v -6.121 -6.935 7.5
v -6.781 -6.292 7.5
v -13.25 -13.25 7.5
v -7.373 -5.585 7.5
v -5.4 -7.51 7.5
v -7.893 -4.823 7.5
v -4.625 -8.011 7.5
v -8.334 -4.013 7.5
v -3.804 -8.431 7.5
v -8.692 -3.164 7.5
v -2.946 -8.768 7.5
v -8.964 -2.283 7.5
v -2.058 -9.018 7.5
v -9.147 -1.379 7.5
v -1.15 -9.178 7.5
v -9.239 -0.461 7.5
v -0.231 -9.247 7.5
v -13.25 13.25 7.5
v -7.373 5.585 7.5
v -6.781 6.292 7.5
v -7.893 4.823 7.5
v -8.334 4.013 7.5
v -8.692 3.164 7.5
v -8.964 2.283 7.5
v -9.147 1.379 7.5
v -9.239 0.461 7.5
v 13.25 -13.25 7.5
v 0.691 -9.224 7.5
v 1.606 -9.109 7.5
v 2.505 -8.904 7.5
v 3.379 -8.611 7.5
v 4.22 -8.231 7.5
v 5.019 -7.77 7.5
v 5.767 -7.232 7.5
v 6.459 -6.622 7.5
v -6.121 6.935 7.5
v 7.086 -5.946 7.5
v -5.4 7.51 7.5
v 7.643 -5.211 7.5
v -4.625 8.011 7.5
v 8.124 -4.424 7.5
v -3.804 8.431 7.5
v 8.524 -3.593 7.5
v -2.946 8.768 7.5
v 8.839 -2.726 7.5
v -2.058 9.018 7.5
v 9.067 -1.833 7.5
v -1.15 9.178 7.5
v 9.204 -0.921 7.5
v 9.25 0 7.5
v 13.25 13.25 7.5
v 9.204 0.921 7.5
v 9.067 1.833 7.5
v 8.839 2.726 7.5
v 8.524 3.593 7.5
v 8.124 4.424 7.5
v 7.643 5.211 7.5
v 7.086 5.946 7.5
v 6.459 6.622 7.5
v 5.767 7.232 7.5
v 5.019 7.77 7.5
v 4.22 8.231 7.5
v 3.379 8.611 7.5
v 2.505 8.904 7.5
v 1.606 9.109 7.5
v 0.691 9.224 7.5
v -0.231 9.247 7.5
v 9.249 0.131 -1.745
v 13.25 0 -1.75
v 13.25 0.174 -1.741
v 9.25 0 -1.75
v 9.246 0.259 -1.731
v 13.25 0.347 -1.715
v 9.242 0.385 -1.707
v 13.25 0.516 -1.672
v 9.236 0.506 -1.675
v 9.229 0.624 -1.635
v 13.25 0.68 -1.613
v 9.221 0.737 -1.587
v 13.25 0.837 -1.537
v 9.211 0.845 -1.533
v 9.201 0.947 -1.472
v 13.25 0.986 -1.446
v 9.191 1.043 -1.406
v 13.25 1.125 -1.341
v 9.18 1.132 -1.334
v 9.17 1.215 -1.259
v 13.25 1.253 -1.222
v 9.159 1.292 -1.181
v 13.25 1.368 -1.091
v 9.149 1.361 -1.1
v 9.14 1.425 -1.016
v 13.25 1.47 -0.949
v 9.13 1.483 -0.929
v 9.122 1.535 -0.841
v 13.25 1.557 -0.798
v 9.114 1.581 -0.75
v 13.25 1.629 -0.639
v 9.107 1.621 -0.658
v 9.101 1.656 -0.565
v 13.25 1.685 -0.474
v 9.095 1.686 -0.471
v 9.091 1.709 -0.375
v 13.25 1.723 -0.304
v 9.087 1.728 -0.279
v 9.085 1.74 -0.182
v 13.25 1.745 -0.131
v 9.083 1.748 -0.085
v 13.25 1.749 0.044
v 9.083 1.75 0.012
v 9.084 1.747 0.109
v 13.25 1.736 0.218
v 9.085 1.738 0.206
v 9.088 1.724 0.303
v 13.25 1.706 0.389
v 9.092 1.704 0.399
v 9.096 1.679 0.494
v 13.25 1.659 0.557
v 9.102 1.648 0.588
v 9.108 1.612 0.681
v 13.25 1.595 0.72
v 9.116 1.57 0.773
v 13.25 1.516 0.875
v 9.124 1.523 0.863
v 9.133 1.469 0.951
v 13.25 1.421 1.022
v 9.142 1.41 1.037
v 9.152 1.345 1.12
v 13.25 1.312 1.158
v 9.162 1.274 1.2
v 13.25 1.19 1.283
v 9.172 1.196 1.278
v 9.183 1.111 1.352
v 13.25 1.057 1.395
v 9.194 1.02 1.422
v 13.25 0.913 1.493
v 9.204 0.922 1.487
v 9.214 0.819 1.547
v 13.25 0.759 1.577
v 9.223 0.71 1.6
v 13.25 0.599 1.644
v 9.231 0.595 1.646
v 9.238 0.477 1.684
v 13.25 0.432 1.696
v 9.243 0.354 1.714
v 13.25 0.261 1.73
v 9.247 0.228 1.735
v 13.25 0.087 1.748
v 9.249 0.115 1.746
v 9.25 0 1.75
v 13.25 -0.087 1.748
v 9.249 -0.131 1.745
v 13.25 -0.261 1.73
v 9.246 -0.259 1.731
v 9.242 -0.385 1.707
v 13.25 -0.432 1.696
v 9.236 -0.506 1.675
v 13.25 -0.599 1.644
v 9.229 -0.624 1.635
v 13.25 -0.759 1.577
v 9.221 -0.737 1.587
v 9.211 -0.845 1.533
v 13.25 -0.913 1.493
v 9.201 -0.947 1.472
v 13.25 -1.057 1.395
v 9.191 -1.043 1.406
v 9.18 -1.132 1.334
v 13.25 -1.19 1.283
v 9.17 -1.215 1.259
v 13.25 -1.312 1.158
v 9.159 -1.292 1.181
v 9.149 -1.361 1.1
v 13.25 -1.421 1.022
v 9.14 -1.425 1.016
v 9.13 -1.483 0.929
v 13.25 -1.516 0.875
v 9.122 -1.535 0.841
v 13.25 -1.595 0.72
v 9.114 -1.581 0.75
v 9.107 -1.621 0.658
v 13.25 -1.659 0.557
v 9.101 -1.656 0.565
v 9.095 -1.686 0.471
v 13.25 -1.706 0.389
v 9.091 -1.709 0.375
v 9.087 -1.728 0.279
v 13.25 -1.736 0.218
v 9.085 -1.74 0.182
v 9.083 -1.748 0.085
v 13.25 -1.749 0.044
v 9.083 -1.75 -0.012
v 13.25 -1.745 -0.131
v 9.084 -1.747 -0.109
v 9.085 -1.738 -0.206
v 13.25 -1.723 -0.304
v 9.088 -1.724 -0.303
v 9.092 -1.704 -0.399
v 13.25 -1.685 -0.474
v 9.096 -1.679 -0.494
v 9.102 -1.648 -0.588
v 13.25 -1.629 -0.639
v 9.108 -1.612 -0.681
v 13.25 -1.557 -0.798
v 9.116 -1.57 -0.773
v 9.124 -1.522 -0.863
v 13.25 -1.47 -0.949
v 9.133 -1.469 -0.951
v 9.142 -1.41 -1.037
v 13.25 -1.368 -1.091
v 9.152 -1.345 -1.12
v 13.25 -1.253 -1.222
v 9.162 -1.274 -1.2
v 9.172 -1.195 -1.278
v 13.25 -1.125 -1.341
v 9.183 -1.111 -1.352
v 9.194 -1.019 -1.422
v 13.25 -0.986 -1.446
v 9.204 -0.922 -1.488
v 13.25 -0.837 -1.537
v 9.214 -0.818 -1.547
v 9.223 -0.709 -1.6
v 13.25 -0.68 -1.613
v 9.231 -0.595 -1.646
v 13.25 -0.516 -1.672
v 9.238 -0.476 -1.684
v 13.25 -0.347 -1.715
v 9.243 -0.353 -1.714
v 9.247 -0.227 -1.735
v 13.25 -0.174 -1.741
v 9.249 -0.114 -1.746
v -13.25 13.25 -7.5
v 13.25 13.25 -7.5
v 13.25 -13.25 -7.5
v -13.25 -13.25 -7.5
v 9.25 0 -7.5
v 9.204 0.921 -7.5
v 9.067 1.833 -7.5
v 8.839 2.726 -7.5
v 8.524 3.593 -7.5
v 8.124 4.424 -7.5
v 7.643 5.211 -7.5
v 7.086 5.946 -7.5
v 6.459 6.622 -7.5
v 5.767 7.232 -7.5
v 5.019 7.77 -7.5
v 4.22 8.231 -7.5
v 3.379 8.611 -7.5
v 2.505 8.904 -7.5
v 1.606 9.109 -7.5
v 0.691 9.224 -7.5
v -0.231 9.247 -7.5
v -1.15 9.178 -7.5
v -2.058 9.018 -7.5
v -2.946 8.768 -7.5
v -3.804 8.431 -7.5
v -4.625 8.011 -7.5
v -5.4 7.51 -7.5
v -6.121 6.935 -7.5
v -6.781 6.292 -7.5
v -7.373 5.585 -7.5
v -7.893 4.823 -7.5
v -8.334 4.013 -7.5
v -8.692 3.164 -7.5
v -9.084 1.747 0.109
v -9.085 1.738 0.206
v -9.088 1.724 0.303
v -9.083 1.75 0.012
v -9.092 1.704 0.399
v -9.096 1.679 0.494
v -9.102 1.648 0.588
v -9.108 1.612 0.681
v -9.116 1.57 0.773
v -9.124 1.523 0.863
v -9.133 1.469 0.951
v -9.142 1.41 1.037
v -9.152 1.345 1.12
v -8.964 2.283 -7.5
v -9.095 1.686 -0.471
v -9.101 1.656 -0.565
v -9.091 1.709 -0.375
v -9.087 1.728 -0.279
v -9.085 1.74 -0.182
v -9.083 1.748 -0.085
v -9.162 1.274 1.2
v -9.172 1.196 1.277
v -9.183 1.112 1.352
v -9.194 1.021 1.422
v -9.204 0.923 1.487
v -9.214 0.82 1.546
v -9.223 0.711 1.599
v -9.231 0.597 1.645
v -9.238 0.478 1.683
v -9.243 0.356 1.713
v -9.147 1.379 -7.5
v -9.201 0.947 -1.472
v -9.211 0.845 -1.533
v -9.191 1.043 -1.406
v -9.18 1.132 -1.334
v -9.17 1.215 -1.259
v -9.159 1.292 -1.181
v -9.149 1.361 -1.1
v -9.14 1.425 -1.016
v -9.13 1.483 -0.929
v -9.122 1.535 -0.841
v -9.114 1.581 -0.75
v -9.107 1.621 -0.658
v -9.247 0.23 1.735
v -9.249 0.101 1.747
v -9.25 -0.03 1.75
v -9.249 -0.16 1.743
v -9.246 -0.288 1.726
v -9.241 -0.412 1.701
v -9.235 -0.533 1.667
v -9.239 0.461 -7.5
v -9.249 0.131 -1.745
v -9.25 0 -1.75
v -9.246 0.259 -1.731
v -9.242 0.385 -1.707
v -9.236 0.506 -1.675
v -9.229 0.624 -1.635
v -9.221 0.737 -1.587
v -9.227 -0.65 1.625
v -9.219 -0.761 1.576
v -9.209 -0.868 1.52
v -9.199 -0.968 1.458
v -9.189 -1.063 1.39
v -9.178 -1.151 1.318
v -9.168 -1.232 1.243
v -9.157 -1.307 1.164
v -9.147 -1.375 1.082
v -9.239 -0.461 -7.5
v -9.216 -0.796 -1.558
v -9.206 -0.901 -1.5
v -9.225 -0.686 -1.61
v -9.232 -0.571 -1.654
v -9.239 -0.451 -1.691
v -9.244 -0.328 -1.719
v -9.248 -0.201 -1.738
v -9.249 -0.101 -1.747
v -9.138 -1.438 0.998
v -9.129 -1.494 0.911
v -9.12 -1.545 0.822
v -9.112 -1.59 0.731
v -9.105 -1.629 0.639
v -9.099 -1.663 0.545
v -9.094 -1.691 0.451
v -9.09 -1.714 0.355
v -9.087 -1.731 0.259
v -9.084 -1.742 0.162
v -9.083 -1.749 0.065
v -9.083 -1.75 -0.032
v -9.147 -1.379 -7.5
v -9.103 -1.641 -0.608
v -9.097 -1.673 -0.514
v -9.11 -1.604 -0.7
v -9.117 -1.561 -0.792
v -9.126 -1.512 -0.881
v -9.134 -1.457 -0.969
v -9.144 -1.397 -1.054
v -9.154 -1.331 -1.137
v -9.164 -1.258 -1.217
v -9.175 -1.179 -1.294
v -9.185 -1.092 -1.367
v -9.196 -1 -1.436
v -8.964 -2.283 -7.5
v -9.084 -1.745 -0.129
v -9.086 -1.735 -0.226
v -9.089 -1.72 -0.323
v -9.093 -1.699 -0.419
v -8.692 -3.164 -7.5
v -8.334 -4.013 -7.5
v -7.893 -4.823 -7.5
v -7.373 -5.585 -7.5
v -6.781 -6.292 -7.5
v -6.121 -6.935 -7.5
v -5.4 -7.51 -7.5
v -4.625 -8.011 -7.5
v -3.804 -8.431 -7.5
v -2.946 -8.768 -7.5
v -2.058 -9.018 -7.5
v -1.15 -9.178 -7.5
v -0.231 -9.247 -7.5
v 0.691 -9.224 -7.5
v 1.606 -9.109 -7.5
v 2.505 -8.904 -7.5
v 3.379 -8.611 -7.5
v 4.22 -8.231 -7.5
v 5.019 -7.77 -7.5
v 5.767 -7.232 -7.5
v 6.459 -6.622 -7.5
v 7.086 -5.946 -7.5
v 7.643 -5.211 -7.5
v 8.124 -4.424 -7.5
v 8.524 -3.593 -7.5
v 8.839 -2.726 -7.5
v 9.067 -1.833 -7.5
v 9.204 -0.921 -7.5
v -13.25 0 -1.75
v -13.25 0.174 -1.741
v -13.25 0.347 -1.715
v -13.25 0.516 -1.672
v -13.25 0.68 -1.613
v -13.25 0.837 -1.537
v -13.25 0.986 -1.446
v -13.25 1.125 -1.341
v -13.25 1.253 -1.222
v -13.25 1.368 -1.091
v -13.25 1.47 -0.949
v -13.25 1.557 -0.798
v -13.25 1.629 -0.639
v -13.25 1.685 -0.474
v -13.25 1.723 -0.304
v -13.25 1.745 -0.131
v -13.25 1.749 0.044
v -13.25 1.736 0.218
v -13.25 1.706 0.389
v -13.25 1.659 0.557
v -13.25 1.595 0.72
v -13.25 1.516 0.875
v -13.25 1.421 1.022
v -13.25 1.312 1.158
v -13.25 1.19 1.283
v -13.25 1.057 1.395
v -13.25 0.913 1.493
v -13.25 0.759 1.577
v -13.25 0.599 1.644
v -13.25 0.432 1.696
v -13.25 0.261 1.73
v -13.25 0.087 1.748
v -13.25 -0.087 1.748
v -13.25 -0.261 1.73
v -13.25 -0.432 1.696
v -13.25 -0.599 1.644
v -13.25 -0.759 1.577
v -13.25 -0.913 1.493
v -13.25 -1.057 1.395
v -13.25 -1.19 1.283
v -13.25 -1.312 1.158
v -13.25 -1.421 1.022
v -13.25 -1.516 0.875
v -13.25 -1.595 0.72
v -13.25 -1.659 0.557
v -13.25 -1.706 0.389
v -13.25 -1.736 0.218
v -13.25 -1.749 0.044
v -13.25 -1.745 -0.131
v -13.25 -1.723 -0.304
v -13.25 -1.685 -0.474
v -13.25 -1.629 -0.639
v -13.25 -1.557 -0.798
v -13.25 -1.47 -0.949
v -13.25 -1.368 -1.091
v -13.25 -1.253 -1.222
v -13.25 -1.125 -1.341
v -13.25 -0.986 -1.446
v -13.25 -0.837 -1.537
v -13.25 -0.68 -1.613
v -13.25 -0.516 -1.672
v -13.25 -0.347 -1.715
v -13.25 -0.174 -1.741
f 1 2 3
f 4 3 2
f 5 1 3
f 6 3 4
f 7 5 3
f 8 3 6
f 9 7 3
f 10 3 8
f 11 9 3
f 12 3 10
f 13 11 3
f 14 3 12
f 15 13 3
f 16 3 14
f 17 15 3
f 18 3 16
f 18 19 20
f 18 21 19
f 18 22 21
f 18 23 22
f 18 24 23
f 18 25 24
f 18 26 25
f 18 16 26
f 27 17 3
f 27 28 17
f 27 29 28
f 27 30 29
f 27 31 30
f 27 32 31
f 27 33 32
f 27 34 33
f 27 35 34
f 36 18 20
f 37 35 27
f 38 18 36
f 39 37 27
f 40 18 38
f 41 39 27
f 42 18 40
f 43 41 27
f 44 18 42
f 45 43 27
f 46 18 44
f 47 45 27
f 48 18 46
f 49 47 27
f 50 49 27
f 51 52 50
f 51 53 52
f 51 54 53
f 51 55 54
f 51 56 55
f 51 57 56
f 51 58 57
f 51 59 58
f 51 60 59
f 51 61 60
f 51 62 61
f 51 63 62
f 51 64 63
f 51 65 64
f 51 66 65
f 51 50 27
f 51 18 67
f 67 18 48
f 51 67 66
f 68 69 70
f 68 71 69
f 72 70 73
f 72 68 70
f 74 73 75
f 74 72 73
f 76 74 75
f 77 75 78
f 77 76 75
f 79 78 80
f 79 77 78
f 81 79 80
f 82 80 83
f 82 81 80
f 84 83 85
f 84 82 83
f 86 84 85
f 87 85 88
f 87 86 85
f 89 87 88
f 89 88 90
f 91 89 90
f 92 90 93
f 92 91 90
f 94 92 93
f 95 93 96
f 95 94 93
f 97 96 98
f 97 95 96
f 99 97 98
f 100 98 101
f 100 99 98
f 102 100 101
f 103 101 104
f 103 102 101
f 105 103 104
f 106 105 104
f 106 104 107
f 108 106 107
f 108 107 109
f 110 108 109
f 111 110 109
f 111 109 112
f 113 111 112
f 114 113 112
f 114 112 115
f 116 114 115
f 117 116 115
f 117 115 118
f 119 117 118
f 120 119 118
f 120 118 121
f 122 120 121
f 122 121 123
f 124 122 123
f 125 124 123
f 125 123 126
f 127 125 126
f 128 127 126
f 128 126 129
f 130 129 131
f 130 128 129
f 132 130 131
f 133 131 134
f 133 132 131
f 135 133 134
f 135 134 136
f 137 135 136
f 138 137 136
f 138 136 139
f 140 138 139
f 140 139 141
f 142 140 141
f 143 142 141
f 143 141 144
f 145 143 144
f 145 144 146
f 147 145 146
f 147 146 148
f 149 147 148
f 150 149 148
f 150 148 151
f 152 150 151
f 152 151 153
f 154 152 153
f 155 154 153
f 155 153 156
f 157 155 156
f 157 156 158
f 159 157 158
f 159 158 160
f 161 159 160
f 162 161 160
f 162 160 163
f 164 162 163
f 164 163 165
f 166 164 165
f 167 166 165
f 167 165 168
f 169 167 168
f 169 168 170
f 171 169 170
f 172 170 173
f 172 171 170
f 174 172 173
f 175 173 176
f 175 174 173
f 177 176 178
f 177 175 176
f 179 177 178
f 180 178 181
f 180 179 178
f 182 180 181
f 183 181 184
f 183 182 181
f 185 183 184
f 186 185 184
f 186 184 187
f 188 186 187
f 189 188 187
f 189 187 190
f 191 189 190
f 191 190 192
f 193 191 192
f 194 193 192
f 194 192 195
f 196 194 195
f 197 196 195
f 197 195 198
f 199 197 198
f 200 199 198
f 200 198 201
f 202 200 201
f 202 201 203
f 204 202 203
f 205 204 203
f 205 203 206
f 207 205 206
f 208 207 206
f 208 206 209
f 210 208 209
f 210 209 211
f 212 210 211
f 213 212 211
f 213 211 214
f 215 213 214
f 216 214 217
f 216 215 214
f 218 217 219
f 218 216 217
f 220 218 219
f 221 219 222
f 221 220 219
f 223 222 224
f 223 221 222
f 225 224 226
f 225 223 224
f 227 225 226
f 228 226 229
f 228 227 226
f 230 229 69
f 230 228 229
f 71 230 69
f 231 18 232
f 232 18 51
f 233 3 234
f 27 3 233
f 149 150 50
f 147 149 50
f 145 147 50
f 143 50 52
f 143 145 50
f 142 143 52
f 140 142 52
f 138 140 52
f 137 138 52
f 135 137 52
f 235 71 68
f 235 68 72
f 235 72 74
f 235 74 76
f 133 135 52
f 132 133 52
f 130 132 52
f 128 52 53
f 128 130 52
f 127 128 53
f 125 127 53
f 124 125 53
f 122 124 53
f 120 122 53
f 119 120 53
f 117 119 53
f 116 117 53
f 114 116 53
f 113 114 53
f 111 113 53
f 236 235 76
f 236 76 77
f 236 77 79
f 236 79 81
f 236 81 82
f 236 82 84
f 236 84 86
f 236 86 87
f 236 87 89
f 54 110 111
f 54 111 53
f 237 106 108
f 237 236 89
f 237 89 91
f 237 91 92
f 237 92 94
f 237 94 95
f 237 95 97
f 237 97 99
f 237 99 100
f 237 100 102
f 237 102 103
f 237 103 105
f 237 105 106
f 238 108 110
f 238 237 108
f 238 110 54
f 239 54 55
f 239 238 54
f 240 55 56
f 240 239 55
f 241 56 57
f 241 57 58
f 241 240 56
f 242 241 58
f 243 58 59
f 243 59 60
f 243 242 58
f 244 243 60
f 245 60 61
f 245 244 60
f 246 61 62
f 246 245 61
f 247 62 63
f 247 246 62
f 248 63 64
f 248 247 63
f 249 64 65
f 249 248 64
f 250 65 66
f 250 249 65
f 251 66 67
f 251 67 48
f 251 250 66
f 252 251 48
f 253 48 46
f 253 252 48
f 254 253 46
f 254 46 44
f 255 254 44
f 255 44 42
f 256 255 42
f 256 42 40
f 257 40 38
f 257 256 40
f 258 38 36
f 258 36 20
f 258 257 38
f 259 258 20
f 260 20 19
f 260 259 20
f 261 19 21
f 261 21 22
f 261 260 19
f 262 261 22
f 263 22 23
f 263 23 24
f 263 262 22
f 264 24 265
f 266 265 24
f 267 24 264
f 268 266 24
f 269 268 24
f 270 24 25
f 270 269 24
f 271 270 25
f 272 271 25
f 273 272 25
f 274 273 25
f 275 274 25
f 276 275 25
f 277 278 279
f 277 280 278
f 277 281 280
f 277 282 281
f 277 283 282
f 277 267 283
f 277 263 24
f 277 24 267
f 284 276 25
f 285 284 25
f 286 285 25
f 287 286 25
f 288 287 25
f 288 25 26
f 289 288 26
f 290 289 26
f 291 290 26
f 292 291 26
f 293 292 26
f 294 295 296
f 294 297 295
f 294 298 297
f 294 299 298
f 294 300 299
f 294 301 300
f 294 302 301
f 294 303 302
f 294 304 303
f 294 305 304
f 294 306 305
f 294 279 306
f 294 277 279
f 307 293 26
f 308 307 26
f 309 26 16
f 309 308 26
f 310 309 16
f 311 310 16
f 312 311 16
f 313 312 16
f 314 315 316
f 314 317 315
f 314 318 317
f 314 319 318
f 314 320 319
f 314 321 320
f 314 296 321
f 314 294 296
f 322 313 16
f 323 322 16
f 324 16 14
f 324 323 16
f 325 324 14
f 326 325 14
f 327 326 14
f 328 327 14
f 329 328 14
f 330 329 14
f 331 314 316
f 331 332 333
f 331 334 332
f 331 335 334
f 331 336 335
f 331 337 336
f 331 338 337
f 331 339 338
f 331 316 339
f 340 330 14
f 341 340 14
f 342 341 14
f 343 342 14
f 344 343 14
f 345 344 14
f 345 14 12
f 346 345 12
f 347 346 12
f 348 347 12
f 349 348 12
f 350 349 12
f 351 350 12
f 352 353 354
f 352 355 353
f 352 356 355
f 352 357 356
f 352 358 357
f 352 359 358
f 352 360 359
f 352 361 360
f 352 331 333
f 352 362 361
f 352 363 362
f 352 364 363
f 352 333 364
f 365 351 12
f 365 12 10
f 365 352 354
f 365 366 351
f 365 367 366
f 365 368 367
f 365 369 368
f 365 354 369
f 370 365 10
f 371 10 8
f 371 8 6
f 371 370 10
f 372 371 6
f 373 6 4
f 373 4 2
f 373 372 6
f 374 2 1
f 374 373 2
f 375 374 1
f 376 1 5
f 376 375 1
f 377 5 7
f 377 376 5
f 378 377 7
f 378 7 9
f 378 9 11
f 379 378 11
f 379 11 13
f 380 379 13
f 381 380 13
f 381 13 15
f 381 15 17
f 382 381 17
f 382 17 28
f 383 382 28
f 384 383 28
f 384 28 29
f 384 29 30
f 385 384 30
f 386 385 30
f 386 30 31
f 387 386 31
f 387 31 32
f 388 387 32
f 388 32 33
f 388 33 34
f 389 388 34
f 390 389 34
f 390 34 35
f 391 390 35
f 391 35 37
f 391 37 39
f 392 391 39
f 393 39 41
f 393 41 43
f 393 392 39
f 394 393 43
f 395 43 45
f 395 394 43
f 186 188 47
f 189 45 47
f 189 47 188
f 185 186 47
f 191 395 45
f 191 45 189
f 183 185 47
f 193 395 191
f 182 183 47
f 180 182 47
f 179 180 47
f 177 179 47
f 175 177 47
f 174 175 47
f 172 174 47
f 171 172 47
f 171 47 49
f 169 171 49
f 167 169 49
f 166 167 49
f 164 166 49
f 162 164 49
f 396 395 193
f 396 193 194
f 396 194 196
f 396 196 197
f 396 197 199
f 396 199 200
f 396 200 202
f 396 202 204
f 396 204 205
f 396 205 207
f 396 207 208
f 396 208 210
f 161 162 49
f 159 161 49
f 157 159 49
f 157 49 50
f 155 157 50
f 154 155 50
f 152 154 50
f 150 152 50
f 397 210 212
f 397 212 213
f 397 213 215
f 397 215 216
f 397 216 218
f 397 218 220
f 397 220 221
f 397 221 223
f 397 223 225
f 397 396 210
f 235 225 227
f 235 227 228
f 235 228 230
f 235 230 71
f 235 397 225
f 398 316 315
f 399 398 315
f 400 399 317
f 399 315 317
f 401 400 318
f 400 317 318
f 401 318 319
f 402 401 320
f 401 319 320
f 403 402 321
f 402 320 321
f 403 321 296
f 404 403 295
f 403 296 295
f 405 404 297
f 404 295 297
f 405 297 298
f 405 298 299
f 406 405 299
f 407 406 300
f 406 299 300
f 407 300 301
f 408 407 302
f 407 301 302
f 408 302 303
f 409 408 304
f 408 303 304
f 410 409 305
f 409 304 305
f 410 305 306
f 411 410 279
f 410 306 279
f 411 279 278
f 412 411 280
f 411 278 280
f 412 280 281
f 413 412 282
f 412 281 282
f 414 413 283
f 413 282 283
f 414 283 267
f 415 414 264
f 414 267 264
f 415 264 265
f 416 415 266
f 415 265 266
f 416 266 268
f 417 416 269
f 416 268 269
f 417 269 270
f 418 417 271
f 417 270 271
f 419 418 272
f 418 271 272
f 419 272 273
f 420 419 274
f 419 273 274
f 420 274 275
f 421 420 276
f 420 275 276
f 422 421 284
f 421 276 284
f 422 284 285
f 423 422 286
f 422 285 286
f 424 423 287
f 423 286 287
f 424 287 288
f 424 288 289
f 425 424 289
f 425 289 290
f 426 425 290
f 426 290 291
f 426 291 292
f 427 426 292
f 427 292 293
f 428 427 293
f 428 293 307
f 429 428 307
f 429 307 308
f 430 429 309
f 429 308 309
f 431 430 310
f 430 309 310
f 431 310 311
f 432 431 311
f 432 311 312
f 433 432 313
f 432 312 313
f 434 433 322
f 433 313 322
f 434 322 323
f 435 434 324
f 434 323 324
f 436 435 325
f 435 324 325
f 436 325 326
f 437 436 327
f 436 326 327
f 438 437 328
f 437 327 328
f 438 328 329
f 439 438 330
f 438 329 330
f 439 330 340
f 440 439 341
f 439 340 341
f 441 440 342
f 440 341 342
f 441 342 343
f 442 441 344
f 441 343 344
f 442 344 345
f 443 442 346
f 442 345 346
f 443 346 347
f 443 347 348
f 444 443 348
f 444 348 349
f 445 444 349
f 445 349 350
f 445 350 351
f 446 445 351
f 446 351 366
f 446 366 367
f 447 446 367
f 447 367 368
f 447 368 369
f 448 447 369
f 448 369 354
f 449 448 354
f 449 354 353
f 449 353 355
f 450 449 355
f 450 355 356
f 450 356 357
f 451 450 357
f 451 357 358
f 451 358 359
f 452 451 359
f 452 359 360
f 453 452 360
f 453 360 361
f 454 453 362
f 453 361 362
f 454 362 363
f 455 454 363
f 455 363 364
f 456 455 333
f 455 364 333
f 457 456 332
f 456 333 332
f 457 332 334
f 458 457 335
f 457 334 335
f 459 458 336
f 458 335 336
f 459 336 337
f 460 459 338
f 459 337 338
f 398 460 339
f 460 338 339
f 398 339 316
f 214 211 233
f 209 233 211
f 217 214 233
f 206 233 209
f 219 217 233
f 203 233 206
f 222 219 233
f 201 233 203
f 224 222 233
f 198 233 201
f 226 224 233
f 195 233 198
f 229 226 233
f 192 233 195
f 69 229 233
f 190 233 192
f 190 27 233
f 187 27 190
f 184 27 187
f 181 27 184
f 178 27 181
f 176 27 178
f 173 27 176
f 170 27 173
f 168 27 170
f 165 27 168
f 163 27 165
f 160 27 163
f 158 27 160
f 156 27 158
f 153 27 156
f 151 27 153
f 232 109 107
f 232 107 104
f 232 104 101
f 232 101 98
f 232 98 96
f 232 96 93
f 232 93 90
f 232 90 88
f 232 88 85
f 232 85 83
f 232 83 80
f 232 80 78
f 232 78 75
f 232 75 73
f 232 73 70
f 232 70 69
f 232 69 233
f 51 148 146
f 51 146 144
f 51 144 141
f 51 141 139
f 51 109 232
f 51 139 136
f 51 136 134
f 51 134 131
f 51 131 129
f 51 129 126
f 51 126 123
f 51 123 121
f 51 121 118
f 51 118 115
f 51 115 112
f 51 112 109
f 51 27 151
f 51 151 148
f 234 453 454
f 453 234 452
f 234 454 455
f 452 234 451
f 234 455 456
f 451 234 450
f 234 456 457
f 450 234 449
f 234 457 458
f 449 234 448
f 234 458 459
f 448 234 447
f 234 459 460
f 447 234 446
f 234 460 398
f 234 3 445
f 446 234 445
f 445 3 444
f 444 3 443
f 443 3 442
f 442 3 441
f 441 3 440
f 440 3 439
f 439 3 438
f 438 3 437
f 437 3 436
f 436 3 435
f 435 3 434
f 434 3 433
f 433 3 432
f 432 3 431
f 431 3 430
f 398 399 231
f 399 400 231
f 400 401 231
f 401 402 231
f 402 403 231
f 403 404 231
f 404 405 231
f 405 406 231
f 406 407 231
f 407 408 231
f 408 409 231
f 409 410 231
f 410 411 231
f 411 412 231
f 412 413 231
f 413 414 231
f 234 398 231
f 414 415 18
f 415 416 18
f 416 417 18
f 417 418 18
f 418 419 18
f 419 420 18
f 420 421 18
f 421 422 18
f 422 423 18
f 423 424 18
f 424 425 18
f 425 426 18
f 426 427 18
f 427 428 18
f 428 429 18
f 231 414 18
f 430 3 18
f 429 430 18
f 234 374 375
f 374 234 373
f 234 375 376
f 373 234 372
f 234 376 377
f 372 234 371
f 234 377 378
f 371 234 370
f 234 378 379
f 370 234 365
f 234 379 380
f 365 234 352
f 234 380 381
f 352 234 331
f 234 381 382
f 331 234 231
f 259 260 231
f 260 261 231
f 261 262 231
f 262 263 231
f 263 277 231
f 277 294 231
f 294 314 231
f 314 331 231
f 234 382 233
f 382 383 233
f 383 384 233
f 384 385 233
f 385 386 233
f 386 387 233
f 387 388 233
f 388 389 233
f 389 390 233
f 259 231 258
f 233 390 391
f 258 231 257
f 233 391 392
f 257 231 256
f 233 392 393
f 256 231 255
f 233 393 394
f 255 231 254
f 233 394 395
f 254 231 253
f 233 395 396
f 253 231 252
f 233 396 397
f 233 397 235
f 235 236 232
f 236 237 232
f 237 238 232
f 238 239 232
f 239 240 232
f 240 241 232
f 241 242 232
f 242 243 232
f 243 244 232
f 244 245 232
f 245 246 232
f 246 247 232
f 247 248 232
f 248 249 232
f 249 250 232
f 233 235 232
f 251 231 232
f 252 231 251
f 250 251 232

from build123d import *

# Parameters (mm, degrees)
SKETCH_1_W               = 26.5
SKETCH_1_H               = 26.5
SKETCH_1_R               = 9.25
EXTRUDE_1_DEPTH          = 7.5
SKETCH_3_R               = 1.75
CUT_EXTRUDE_1_DEPTH      = 14.25
CUT_EXTRUDE_1_DEPTH_BACK = 14.25


with BuildPart() as part:
    # ｽｹｯﾁ1 → ﾎﾞｽ - 押し出し1 (new body, symmetric)
    with BuildSketch(Plane.XY):
        Rectangle(SKETCH_1_W, SKETCH_1_H)
        Circle(SKETCH_1_R, mode=Mode.SUBTRACT)
    extrude(amount=EXTRUDE_1_DEPTH, both=True)

    # ｽｹｯﾁ3 → ｶｯﾄ - 押し出し1 (cut, two sides)
    with BuildSketch(Plane(origin=(0, 0, 0), x_dir=(0, 0, -1), z_dir=(1, 0, 0))) as cut_extrude_1_sk:
        Circle(SKETCH_3_R)
    extrude(amount=CUT_EXTRUDE_1_DEPTH, mode=Mode.SUBTRACT)
    extrude(cut_extrude_1_sk.sketch, amount=-CUT_EXTRUDE_1_DEPTH_BACK, mode=Mode.SUBTRACT)


solid = part.part
